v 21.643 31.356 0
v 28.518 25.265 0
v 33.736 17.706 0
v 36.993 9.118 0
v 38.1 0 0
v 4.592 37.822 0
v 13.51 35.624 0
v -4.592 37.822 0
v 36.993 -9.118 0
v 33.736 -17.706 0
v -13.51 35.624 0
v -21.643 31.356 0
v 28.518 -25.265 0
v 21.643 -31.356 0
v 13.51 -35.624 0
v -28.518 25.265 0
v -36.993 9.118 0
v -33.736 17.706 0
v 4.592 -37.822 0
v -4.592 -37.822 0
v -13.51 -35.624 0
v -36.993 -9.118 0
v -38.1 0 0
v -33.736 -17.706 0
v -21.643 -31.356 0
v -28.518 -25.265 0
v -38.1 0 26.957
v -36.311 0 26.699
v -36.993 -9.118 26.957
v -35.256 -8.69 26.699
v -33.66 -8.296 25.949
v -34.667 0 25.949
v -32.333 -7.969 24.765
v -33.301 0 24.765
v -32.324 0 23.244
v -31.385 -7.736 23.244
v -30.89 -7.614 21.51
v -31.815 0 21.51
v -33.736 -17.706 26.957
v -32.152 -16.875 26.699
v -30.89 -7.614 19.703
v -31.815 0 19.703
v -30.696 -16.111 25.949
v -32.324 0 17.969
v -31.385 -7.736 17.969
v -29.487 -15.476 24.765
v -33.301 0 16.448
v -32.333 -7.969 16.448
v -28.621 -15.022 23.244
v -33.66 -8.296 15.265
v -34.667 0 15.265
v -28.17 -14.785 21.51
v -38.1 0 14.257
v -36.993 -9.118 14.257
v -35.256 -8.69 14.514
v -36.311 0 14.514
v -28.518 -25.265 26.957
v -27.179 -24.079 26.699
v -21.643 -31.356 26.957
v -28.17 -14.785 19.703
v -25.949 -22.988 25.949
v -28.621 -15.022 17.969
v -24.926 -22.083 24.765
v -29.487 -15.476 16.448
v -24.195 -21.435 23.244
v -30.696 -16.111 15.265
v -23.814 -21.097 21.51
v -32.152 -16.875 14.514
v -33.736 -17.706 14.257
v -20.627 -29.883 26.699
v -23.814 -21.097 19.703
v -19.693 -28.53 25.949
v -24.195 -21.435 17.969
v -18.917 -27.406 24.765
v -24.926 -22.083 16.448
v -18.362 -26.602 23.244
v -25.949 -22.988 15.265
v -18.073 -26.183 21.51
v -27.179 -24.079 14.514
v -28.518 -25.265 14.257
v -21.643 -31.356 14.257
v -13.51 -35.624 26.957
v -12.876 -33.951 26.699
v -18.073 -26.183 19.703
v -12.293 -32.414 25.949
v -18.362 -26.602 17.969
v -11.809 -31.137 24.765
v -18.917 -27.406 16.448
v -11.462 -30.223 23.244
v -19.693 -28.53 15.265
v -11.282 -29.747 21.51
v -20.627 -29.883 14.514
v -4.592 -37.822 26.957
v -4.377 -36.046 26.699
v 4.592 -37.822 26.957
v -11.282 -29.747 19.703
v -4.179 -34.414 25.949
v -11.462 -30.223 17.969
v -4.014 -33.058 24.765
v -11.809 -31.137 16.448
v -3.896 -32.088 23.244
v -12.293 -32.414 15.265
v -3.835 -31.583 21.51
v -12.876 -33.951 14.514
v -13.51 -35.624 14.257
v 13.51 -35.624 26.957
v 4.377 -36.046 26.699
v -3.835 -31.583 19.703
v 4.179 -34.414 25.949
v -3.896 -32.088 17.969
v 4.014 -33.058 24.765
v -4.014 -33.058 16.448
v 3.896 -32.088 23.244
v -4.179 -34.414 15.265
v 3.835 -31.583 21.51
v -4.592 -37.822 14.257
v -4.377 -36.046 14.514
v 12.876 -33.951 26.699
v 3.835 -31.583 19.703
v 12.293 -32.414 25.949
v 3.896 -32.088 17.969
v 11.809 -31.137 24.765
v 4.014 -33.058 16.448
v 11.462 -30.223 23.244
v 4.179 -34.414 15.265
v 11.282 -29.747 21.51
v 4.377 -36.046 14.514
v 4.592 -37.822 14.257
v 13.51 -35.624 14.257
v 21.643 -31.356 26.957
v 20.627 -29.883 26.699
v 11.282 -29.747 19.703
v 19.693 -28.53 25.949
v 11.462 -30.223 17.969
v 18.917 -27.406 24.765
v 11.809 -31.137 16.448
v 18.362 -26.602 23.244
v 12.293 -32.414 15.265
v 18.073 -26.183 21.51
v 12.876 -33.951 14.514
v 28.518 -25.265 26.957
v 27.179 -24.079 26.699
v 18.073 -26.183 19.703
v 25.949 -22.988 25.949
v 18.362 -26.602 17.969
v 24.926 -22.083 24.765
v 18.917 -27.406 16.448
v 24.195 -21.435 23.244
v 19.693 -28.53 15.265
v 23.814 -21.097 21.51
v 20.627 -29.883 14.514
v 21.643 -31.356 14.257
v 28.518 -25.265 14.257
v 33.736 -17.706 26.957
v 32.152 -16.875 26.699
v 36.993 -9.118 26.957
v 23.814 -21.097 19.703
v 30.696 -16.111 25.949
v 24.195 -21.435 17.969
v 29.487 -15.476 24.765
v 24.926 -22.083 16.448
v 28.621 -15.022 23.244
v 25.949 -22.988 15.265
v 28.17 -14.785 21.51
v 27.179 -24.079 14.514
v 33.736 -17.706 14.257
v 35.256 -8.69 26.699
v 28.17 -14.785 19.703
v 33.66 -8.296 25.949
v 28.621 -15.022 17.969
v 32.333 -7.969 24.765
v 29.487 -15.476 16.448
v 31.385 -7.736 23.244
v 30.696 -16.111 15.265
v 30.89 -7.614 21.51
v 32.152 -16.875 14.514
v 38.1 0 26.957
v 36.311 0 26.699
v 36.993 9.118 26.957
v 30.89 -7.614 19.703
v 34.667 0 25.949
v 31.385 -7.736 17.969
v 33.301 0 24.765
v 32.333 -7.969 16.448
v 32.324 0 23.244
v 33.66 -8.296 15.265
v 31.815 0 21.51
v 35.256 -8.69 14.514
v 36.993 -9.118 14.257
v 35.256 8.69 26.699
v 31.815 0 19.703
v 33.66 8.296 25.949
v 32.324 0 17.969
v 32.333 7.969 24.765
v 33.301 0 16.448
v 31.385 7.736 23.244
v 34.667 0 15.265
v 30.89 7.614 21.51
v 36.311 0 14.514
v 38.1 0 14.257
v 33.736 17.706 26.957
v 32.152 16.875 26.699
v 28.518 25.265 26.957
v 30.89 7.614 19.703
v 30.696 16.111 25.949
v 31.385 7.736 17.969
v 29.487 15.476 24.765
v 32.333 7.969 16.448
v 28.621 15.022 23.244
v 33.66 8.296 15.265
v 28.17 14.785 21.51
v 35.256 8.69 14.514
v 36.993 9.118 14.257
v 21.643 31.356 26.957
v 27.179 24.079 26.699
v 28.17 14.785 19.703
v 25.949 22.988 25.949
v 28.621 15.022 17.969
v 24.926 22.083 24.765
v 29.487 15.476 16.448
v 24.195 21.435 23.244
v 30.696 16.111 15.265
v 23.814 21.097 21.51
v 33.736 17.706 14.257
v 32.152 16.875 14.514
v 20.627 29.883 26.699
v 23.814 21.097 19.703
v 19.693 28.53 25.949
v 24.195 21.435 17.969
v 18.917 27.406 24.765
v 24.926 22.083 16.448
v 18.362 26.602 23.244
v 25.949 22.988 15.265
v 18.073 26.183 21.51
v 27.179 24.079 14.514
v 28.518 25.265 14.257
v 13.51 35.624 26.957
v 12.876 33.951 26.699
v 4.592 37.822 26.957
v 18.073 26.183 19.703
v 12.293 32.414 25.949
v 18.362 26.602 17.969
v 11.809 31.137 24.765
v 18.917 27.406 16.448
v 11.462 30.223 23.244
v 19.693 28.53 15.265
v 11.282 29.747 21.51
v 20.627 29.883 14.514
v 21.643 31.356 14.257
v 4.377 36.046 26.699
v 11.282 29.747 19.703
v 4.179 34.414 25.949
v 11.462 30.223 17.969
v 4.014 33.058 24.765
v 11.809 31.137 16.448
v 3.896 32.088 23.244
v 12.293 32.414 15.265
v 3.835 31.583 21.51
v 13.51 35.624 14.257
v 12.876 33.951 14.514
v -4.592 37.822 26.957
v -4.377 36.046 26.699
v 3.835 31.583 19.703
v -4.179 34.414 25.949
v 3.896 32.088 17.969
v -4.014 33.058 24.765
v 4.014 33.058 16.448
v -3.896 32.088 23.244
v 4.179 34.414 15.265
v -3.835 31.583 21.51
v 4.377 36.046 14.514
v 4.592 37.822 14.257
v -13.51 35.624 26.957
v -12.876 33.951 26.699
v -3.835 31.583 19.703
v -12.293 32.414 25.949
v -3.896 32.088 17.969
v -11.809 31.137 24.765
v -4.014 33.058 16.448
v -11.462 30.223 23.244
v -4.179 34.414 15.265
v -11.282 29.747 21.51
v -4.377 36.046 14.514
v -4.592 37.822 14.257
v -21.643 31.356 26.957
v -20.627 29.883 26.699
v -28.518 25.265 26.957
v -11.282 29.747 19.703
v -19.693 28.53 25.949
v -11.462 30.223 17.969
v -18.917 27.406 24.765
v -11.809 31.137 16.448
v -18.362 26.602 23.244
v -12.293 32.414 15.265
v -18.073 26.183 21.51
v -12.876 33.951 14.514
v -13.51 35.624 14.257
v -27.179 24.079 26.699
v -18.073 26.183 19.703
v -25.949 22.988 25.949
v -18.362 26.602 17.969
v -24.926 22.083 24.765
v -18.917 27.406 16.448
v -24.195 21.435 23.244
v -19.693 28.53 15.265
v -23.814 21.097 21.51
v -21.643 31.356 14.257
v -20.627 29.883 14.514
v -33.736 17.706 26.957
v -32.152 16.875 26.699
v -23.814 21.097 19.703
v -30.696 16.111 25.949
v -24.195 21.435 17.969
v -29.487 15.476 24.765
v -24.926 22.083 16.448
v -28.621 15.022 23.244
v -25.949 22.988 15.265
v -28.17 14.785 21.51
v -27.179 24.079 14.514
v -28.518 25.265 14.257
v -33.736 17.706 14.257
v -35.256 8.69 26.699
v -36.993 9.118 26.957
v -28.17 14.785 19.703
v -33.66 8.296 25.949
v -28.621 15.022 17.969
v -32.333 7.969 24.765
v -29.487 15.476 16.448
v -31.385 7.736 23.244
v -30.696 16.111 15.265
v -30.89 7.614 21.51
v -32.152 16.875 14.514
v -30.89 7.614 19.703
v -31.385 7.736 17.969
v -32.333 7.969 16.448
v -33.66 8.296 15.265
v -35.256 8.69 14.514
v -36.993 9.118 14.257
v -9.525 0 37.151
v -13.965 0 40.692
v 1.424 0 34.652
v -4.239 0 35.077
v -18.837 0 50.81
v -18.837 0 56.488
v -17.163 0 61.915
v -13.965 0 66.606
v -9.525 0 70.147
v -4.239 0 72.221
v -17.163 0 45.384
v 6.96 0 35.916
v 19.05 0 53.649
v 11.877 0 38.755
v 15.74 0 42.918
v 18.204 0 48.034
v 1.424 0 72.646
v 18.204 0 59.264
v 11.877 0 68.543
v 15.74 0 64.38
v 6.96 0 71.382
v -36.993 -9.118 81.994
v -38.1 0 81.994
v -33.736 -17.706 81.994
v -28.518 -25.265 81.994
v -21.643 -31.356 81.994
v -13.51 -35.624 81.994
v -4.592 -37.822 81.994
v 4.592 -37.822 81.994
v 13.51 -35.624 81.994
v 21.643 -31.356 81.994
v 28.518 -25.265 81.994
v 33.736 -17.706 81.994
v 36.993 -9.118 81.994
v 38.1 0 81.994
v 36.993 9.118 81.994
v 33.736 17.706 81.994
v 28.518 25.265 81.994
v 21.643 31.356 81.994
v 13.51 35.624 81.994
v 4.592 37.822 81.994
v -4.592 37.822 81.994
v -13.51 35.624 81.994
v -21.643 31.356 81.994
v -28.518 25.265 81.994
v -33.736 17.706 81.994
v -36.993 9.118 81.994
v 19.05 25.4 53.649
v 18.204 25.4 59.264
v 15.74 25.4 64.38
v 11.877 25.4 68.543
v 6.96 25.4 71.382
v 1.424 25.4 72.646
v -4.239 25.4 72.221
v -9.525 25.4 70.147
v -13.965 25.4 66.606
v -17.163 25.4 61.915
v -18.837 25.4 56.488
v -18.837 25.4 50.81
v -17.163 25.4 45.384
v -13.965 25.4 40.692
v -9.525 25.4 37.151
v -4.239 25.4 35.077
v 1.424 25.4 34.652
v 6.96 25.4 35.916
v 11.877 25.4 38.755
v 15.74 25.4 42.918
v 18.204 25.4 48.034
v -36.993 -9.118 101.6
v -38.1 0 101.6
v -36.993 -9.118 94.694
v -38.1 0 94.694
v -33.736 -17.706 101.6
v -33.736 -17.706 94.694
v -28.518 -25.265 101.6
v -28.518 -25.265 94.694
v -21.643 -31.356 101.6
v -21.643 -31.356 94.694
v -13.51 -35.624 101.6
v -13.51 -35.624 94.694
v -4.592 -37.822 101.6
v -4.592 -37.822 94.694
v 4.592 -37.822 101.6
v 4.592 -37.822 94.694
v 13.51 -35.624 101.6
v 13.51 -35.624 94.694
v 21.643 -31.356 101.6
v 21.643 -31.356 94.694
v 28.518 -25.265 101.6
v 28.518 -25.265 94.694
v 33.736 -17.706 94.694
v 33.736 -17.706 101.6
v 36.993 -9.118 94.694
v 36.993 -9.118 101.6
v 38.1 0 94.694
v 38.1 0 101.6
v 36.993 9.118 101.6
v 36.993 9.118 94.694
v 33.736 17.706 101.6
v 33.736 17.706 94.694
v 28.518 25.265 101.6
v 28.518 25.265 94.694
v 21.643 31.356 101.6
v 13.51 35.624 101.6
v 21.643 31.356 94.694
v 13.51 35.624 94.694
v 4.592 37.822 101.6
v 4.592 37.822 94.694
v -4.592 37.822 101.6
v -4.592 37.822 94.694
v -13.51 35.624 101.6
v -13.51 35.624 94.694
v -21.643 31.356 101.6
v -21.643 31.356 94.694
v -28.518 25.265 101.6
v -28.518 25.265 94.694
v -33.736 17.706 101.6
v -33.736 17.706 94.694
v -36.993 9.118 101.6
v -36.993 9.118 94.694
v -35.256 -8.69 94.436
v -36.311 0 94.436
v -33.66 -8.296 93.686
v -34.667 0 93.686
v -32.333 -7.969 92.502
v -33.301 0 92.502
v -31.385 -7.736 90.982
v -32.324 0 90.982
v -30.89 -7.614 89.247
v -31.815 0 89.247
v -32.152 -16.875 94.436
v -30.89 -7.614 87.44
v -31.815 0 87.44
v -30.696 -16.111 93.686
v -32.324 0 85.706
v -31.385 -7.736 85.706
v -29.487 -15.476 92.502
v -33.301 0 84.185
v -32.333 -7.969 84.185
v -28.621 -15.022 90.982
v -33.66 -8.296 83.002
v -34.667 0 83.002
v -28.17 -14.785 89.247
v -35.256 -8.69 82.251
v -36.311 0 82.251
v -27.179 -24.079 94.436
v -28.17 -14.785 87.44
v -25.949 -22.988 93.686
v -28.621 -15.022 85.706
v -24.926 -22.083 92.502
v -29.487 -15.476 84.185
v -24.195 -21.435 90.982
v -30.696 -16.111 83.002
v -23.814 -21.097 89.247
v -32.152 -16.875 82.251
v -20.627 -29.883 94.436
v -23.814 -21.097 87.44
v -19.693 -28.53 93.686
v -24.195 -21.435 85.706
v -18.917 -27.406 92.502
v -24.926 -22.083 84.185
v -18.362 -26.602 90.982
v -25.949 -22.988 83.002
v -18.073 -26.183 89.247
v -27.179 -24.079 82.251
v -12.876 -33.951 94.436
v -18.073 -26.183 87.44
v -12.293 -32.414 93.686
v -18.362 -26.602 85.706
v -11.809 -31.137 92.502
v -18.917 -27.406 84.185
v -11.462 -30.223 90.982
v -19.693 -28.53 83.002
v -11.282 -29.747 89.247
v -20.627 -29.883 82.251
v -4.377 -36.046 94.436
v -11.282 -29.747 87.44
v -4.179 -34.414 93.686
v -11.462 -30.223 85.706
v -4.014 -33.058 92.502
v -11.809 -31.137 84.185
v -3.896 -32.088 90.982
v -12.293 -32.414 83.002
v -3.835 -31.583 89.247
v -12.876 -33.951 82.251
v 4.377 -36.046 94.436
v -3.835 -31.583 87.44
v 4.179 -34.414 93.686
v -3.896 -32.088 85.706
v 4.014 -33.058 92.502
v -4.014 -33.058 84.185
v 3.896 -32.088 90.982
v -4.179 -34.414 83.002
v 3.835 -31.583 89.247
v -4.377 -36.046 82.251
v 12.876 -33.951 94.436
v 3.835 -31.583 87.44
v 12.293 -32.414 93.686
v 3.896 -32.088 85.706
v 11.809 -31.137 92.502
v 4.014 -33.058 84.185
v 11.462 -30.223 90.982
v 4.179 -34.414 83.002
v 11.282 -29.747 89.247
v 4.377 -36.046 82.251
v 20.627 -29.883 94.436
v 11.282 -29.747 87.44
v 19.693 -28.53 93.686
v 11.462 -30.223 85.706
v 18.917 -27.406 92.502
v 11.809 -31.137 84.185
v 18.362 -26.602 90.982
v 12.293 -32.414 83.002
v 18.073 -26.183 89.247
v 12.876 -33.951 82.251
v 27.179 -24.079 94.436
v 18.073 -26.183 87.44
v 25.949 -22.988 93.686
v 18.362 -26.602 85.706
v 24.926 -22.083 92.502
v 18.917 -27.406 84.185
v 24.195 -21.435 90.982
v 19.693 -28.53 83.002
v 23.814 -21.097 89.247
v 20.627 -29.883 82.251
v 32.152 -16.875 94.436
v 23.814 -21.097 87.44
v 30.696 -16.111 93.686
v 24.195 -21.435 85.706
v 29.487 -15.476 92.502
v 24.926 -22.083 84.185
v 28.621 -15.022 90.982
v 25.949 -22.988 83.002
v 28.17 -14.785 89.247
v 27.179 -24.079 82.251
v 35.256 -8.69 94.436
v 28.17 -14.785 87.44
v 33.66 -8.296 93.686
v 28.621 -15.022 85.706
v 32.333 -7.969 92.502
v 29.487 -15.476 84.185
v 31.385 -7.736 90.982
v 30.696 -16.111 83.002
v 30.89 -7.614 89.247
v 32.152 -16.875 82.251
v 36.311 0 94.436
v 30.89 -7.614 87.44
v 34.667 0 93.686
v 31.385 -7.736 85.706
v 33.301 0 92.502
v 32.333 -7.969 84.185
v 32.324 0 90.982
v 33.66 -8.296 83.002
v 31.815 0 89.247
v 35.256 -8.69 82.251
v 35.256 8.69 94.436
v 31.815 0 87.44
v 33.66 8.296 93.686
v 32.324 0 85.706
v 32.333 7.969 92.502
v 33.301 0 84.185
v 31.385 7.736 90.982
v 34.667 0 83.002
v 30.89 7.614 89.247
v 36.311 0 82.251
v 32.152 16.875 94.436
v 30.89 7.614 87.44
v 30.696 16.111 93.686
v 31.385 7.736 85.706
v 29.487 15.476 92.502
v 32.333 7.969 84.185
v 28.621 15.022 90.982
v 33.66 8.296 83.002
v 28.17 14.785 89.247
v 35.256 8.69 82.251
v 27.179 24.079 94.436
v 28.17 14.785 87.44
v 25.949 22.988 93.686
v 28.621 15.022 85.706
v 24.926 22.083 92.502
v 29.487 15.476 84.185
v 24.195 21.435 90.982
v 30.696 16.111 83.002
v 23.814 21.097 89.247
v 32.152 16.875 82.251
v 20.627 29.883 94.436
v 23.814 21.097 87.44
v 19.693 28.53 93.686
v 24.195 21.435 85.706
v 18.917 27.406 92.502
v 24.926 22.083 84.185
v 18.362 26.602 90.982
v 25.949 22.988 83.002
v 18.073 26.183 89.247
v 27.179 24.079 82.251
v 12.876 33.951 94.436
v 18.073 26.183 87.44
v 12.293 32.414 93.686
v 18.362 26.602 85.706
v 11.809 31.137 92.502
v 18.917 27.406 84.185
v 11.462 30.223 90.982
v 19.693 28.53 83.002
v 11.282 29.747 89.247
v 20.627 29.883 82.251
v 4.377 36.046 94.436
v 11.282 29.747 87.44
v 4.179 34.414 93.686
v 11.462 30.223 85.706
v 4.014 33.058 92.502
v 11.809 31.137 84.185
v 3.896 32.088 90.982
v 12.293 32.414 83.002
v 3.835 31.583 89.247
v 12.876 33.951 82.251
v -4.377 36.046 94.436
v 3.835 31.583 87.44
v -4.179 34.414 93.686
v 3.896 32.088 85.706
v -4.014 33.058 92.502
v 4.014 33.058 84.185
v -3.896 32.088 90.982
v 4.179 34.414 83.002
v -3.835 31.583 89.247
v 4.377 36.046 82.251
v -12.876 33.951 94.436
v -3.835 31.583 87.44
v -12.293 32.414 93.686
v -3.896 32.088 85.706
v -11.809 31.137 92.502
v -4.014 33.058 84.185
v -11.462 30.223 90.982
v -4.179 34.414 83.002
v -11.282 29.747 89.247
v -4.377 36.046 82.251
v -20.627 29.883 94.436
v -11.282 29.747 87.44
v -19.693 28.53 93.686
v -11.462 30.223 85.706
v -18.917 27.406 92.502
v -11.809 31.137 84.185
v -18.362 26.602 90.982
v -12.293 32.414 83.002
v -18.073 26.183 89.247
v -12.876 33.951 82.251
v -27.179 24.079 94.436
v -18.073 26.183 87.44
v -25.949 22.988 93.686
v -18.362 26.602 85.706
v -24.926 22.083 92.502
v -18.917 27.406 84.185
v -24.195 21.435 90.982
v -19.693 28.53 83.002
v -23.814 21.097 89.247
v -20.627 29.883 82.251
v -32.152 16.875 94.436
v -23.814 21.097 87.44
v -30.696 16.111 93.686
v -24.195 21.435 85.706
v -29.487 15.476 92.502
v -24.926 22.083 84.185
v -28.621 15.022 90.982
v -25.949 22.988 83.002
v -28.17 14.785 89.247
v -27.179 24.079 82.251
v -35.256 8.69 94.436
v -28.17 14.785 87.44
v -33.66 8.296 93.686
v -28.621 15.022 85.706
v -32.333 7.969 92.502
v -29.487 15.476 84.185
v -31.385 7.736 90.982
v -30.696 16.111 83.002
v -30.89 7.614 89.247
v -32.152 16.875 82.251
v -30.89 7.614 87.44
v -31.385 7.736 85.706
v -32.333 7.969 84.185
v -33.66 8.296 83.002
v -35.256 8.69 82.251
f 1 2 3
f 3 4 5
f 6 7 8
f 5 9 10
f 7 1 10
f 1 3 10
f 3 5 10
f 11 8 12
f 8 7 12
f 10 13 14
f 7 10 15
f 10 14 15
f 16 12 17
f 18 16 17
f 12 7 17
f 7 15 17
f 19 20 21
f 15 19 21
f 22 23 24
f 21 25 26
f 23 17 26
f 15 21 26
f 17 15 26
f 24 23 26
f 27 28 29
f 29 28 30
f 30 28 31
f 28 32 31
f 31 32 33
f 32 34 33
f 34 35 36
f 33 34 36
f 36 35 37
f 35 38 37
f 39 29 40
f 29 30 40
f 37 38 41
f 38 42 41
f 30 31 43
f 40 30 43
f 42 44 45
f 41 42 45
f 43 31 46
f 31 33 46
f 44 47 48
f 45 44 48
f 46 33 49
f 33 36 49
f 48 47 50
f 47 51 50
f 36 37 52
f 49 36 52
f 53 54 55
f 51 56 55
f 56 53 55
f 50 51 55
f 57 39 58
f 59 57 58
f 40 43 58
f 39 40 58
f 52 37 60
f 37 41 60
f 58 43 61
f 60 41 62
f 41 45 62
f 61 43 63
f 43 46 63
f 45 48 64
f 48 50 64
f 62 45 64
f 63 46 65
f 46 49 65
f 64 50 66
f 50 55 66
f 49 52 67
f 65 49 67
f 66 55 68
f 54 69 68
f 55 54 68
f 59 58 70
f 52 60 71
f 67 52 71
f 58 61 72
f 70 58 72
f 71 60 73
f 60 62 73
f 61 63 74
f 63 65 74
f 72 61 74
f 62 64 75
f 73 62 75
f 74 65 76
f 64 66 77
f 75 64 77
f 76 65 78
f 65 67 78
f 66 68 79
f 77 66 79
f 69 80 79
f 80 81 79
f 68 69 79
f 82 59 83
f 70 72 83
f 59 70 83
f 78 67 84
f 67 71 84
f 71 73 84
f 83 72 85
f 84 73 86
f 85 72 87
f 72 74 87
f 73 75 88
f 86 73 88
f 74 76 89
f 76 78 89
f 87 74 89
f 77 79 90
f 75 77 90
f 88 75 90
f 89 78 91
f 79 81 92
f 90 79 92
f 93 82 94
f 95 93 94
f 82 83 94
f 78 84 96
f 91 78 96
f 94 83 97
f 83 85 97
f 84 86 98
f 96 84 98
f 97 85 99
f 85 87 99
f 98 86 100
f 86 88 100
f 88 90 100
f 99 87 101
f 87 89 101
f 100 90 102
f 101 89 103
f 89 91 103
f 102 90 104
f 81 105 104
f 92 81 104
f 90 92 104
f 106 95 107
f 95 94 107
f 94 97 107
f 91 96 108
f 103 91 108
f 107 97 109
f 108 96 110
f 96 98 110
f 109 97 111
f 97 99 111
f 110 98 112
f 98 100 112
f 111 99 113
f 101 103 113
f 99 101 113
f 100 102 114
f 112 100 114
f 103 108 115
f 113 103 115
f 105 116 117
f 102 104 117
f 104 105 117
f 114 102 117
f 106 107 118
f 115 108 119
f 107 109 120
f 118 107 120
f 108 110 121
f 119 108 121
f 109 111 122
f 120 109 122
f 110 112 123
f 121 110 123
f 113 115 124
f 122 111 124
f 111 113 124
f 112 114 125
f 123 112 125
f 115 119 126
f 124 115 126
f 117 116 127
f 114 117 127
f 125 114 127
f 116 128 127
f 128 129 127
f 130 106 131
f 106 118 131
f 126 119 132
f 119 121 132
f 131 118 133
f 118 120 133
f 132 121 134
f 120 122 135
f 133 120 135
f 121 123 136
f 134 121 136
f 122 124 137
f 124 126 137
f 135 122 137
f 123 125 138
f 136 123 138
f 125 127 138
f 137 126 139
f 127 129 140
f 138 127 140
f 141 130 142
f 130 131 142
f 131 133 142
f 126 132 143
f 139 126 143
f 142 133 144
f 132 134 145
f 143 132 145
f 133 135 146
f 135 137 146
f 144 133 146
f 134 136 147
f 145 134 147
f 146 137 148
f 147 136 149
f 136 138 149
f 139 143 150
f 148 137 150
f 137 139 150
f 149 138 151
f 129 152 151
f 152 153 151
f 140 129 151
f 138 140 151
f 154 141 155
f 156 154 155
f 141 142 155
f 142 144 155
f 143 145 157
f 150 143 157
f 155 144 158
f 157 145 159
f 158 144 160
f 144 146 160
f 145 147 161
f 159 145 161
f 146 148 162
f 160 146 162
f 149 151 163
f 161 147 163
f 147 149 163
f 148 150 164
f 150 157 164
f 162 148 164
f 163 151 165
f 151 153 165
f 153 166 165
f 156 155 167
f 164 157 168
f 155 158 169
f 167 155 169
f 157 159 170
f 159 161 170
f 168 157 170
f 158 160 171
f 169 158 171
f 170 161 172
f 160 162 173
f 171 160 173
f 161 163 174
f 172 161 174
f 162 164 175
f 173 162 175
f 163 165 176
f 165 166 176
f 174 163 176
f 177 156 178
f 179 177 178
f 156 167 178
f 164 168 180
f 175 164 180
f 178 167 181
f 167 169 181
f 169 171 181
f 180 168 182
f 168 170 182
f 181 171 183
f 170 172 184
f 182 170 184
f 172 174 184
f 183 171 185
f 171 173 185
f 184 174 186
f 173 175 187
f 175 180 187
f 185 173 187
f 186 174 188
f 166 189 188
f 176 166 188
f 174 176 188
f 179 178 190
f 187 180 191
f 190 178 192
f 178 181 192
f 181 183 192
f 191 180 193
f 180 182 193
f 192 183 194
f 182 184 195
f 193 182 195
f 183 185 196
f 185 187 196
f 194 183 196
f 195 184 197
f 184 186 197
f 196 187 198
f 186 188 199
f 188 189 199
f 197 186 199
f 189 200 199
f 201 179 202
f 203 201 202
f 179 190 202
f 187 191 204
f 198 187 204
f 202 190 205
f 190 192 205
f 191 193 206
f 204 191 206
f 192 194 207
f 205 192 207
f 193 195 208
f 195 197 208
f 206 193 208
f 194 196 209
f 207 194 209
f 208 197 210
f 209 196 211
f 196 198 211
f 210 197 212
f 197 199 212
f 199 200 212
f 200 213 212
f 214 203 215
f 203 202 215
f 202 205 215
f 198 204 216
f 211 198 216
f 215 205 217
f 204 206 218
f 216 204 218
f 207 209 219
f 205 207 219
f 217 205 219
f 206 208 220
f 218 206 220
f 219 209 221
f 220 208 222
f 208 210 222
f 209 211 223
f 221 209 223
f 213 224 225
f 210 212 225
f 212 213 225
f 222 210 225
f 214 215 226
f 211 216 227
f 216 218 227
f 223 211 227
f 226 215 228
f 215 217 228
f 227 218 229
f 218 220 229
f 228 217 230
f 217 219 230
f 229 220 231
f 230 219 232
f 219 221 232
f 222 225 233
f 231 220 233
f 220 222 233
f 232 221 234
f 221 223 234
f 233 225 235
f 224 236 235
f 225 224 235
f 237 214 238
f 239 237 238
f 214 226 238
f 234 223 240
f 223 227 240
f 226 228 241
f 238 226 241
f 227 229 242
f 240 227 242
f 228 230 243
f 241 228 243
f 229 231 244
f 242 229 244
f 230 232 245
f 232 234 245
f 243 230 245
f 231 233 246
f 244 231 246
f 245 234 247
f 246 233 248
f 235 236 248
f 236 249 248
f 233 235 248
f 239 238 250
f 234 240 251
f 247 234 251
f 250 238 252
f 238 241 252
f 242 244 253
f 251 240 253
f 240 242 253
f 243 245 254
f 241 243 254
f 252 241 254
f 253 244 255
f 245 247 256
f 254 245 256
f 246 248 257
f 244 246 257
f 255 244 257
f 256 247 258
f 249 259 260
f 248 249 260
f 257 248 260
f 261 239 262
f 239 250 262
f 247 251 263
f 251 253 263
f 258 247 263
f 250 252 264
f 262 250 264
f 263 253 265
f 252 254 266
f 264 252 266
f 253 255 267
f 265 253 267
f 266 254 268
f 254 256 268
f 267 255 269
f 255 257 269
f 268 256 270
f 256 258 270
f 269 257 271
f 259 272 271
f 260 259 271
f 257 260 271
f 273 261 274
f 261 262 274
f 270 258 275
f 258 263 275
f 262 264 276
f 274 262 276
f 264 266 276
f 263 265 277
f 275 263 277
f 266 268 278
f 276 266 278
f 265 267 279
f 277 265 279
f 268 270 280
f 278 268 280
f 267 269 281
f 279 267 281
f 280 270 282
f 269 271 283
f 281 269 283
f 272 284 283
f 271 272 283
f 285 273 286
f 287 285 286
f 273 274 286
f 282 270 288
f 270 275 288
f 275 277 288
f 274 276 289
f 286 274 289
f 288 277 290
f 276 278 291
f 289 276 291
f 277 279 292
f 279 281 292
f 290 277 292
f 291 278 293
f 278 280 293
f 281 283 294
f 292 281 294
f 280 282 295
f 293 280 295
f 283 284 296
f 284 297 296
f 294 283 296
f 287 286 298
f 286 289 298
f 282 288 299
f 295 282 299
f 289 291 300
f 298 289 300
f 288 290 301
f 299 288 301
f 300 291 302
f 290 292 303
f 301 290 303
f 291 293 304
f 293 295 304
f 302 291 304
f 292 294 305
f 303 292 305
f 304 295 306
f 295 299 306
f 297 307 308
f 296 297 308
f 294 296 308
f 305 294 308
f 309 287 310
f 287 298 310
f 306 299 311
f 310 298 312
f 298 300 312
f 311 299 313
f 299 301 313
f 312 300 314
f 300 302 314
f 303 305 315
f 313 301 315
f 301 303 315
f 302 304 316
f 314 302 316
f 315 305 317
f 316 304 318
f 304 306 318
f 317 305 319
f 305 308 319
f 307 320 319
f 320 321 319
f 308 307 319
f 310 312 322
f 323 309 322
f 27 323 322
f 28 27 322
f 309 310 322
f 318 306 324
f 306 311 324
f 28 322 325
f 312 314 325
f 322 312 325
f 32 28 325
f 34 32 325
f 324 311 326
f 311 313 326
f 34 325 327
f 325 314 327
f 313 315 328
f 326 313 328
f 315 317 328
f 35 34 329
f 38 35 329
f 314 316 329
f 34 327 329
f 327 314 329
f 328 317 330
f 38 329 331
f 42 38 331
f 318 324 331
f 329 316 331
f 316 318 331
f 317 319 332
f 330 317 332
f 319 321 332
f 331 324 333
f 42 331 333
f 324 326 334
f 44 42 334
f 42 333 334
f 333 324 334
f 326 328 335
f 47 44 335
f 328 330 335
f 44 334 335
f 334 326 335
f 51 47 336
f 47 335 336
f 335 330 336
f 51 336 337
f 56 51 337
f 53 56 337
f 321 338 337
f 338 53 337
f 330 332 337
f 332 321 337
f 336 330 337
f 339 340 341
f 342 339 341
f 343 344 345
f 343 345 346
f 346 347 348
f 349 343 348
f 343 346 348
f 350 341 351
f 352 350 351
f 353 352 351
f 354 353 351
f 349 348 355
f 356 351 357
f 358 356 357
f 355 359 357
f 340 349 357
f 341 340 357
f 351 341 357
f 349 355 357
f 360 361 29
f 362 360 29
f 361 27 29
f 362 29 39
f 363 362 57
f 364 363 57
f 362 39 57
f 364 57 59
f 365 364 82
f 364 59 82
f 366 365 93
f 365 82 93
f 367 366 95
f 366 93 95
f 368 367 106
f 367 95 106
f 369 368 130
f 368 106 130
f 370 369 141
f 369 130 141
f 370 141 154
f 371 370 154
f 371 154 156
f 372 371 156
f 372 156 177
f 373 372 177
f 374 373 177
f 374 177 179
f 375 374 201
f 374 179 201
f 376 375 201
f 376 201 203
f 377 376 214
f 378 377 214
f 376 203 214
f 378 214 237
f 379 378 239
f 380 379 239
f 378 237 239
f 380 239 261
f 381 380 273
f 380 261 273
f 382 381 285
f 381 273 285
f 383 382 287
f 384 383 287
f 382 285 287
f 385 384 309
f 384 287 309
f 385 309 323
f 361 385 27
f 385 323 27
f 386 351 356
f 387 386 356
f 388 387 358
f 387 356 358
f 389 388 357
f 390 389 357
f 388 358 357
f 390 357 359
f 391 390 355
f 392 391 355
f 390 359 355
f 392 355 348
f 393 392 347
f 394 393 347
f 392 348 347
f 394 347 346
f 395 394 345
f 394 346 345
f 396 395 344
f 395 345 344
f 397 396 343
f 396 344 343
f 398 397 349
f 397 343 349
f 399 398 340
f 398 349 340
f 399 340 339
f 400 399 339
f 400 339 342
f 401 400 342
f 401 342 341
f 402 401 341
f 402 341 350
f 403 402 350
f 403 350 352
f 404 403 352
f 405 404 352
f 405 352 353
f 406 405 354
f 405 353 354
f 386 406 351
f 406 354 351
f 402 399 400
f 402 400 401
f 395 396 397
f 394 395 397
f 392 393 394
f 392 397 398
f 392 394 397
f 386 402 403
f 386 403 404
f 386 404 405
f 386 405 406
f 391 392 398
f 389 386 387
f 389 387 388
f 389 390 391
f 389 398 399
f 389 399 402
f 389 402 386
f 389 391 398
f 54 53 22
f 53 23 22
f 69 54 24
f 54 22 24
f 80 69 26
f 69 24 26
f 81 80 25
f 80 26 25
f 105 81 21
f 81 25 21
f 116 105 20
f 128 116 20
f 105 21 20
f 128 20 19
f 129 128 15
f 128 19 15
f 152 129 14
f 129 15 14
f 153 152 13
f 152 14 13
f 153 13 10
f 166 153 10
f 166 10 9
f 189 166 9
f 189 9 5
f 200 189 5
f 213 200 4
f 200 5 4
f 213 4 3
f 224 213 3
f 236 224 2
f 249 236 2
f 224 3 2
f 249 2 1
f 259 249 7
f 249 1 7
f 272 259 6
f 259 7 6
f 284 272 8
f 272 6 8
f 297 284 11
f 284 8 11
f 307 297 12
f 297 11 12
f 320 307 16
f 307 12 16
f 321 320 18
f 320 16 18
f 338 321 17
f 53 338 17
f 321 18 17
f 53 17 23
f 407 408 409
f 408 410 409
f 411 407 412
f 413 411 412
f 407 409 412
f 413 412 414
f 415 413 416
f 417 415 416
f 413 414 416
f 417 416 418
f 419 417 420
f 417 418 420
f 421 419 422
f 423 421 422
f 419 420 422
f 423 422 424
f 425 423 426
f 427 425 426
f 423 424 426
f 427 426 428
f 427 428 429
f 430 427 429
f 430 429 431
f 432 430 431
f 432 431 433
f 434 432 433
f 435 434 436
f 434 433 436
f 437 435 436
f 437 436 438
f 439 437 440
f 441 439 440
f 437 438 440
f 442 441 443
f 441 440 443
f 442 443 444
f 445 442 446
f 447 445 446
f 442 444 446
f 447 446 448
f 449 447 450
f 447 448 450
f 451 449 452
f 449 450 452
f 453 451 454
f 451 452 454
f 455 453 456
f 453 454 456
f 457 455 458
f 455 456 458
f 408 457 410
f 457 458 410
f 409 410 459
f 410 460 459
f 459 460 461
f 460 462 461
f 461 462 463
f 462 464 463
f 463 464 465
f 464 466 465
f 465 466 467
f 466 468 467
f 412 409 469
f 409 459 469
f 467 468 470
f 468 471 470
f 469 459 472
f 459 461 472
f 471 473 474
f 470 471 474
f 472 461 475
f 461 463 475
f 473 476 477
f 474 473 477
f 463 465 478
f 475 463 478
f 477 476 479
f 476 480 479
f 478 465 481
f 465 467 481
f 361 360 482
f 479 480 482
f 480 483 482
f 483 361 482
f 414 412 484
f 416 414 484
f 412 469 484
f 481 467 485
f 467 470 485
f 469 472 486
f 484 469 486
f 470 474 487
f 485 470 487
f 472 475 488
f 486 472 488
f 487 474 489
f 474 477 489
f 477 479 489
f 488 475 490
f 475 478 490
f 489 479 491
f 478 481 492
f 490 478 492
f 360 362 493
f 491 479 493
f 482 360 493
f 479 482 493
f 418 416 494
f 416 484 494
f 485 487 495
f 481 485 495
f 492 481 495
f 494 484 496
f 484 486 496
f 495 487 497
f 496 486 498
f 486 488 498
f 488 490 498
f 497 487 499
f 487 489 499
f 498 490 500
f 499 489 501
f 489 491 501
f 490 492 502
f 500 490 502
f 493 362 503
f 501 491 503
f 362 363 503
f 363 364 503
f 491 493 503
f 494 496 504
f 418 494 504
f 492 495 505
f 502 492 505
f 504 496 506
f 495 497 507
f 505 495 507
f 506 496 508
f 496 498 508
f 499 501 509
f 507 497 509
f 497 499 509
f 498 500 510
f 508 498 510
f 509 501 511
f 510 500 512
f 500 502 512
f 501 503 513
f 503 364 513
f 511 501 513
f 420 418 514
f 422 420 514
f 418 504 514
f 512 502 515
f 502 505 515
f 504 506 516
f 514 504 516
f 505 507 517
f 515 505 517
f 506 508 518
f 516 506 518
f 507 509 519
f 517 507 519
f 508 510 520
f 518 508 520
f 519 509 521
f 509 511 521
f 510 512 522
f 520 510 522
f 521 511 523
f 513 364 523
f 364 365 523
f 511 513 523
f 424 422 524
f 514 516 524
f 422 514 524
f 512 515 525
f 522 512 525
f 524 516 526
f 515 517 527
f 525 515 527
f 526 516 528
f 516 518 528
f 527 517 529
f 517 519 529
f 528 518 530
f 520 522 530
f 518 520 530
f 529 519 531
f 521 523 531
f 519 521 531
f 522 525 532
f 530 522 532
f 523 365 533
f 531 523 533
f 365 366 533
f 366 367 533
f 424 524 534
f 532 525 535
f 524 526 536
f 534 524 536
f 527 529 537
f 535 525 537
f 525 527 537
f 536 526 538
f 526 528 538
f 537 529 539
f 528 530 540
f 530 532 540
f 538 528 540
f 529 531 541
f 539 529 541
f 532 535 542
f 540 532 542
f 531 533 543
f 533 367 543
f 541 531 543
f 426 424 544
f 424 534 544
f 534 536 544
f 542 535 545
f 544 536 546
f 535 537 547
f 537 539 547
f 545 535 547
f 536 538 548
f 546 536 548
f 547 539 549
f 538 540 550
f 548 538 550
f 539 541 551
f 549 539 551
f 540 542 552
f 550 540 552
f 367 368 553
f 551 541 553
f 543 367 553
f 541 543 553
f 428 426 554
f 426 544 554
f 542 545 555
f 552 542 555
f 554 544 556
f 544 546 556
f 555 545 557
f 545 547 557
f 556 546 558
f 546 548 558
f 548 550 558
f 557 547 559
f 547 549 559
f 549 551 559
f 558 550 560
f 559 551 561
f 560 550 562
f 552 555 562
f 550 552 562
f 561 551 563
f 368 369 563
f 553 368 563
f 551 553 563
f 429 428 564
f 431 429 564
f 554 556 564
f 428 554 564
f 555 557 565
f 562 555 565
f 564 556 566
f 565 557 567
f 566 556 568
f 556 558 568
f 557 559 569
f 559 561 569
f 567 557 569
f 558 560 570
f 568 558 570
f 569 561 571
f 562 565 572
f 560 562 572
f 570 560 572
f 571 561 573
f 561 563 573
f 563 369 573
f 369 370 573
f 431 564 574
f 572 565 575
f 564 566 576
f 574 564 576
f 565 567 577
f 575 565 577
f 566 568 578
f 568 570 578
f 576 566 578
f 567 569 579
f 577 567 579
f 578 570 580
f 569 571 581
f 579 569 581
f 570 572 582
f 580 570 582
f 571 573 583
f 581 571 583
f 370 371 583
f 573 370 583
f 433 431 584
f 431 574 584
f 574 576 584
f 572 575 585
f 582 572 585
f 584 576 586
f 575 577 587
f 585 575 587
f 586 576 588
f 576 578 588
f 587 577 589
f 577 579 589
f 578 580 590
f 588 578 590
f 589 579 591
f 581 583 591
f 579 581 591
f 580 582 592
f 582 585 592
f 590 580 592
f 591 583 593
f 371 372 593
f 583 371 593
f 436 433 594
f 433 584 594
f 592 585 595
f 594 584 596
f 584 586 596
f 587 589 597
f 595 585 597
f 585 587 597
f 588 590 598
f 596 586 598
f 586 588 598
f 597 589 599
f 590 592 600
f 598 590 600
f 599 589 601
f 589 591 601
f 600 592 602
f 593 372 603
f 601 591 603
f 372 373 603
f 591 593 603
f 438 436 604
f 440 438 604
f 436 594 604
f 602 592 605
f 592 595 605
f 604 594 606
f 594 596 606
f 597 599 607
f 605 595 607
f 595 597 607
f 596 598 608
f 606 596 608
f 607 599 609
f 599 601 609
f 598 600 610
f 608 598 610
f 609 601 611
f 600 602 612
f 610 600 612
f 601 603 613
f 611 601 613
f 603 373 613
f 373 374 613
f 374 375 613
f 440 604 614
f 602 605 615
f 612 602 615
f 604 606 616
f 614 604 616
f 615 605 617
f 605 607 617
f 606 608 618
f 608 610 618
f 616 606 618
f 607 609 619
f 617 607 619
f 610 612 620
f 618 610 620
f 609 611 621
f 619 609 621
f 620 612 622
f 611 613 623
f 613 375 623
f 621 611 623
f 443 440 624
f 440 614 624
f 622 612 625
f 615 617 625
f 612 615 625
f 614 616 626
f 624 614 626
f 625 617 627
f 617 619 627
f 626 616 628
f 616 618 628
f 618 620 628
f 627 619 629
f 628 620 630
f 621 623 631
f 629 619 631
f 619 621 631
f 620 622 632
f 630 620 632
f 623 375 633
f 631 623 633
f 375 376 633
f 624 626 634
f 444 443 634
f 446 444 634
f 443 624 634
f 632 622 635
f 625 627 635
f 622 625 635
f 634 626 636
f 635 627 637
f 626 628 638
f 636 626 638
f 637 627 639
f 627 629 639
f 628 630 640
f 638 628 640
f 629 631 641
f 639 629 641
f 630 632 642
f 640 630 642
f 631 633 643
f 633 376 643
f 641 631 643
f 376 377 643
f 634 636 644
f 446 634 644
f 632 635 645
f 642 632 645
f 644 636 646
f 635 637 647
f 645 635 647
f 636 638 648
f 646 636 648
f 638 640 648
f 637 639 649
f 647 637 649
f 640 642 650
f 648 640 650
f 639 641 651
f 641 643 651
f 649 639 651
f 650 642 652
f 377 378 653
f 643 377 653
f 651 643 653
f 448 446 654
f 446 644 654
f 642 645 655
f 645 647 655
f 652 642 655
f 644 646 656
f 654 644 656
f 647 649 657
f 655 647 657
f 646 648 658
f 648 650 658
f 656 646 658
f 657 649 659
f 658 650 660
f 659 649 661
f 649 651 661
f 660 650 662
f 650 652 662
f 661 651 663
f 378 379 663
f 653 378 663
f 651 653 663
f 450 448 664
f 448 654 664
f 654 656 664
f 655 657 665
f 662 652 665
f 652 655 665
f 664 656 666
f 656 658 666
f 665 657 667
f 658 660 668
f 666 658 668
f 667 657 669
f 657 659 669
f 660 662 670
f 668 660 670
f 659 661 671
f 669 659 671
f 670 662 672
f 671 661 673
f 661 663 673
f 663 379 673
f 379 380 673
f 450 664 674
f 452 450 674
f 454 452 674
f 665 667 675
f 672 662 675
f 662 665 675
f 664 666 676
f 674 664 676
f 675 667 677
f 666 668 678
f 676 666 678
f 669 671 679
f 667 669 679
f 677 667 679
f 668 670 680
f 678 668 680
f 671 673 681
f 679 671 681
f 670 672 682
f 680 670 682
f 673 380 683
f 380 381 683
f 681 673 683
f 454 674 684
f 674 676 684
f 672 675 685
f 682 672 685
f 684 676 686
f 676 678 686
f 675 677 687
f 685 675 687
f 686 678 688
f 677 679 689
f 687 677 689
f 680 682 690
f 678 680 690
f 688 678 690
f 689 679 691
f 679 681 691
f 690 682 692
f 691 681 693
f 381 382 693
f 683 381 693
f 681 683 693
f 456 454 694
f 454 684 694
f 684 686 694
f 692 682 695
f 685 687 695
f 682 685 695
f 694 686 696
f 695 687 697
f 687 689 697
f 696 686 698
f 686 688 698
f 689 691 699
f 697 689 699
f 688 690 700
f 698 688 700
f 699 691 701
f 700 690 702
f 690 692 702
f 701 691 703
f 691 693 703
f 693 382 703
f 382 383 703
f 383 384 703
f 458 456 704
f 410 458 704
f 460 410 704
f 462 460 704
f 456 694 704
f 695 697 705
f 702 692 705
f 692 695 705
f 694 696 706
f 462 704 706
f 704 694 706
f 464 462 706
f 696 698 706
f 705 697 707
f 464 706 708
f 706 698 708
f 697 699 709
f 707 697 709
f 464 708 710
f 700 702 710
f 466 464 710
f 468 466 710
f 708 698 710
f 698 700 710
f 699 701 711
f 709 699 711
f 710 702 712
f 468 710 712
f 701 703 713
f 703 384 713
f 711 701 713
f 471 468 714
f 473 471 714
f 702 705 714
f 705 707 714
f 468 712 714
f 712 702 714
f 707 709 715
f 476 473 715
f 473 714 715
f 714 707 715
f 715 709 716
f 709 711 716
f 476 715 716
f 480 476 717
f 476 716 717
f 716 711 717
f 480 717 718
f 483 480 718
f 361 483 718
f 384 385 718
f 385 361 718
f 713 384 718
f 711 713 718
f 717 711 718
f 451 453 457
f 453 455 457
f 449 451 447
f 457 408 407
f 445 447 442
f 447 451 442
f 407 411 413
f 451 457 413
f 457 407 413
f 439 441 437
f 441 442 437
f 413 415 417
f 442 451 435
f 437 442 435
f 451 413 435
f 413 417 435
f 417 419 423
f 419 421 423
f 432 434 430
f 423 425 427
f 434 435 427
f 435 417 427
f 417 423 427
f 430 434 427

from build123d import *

# Parameters (mm, degrees)
F2_R     = 19.05
F3_DEPTH = 25.4


with BuildPart() as f1:
    # F0 (on Front) → F1 (revolve)
    with BuildSketch(Plane.XZ):
        with BuildLine():
            Line((-38.1, 0), (0, 0))
            Line((0, 0), (0, 101.6))
            Line((0, 101.6), (-38.1, 101.6))
            Line((-38.1, 101.6), (-38.1, 94.693672))
            ThreePointArc((-38.1, 94.693672), (-31.75, 88.343672), (-38.1, 81.993672))
            Line((-38.1, 81.993672), (-38.1, 26.956592))
            ThreePointArc((-38.1, 26.956592), (-31.75, 20.606592), (-38.1, 14.256592))
            Line((-38.1, 14.256592), (-38.1, 0))
        make_face()
    revolve(axis=Axis((0, 0, 50.8), (0, 0, 1)))

    # F2 (on Front) → F3 (cut)
    with BuildSketch(Plane.XZ):
        with Locations((0, 53.649068)):
            Circle(F2_R)
    extrude(amount=-F3_DEPTH, mode=Mode.SUBTRACT)


solid = f1.part
